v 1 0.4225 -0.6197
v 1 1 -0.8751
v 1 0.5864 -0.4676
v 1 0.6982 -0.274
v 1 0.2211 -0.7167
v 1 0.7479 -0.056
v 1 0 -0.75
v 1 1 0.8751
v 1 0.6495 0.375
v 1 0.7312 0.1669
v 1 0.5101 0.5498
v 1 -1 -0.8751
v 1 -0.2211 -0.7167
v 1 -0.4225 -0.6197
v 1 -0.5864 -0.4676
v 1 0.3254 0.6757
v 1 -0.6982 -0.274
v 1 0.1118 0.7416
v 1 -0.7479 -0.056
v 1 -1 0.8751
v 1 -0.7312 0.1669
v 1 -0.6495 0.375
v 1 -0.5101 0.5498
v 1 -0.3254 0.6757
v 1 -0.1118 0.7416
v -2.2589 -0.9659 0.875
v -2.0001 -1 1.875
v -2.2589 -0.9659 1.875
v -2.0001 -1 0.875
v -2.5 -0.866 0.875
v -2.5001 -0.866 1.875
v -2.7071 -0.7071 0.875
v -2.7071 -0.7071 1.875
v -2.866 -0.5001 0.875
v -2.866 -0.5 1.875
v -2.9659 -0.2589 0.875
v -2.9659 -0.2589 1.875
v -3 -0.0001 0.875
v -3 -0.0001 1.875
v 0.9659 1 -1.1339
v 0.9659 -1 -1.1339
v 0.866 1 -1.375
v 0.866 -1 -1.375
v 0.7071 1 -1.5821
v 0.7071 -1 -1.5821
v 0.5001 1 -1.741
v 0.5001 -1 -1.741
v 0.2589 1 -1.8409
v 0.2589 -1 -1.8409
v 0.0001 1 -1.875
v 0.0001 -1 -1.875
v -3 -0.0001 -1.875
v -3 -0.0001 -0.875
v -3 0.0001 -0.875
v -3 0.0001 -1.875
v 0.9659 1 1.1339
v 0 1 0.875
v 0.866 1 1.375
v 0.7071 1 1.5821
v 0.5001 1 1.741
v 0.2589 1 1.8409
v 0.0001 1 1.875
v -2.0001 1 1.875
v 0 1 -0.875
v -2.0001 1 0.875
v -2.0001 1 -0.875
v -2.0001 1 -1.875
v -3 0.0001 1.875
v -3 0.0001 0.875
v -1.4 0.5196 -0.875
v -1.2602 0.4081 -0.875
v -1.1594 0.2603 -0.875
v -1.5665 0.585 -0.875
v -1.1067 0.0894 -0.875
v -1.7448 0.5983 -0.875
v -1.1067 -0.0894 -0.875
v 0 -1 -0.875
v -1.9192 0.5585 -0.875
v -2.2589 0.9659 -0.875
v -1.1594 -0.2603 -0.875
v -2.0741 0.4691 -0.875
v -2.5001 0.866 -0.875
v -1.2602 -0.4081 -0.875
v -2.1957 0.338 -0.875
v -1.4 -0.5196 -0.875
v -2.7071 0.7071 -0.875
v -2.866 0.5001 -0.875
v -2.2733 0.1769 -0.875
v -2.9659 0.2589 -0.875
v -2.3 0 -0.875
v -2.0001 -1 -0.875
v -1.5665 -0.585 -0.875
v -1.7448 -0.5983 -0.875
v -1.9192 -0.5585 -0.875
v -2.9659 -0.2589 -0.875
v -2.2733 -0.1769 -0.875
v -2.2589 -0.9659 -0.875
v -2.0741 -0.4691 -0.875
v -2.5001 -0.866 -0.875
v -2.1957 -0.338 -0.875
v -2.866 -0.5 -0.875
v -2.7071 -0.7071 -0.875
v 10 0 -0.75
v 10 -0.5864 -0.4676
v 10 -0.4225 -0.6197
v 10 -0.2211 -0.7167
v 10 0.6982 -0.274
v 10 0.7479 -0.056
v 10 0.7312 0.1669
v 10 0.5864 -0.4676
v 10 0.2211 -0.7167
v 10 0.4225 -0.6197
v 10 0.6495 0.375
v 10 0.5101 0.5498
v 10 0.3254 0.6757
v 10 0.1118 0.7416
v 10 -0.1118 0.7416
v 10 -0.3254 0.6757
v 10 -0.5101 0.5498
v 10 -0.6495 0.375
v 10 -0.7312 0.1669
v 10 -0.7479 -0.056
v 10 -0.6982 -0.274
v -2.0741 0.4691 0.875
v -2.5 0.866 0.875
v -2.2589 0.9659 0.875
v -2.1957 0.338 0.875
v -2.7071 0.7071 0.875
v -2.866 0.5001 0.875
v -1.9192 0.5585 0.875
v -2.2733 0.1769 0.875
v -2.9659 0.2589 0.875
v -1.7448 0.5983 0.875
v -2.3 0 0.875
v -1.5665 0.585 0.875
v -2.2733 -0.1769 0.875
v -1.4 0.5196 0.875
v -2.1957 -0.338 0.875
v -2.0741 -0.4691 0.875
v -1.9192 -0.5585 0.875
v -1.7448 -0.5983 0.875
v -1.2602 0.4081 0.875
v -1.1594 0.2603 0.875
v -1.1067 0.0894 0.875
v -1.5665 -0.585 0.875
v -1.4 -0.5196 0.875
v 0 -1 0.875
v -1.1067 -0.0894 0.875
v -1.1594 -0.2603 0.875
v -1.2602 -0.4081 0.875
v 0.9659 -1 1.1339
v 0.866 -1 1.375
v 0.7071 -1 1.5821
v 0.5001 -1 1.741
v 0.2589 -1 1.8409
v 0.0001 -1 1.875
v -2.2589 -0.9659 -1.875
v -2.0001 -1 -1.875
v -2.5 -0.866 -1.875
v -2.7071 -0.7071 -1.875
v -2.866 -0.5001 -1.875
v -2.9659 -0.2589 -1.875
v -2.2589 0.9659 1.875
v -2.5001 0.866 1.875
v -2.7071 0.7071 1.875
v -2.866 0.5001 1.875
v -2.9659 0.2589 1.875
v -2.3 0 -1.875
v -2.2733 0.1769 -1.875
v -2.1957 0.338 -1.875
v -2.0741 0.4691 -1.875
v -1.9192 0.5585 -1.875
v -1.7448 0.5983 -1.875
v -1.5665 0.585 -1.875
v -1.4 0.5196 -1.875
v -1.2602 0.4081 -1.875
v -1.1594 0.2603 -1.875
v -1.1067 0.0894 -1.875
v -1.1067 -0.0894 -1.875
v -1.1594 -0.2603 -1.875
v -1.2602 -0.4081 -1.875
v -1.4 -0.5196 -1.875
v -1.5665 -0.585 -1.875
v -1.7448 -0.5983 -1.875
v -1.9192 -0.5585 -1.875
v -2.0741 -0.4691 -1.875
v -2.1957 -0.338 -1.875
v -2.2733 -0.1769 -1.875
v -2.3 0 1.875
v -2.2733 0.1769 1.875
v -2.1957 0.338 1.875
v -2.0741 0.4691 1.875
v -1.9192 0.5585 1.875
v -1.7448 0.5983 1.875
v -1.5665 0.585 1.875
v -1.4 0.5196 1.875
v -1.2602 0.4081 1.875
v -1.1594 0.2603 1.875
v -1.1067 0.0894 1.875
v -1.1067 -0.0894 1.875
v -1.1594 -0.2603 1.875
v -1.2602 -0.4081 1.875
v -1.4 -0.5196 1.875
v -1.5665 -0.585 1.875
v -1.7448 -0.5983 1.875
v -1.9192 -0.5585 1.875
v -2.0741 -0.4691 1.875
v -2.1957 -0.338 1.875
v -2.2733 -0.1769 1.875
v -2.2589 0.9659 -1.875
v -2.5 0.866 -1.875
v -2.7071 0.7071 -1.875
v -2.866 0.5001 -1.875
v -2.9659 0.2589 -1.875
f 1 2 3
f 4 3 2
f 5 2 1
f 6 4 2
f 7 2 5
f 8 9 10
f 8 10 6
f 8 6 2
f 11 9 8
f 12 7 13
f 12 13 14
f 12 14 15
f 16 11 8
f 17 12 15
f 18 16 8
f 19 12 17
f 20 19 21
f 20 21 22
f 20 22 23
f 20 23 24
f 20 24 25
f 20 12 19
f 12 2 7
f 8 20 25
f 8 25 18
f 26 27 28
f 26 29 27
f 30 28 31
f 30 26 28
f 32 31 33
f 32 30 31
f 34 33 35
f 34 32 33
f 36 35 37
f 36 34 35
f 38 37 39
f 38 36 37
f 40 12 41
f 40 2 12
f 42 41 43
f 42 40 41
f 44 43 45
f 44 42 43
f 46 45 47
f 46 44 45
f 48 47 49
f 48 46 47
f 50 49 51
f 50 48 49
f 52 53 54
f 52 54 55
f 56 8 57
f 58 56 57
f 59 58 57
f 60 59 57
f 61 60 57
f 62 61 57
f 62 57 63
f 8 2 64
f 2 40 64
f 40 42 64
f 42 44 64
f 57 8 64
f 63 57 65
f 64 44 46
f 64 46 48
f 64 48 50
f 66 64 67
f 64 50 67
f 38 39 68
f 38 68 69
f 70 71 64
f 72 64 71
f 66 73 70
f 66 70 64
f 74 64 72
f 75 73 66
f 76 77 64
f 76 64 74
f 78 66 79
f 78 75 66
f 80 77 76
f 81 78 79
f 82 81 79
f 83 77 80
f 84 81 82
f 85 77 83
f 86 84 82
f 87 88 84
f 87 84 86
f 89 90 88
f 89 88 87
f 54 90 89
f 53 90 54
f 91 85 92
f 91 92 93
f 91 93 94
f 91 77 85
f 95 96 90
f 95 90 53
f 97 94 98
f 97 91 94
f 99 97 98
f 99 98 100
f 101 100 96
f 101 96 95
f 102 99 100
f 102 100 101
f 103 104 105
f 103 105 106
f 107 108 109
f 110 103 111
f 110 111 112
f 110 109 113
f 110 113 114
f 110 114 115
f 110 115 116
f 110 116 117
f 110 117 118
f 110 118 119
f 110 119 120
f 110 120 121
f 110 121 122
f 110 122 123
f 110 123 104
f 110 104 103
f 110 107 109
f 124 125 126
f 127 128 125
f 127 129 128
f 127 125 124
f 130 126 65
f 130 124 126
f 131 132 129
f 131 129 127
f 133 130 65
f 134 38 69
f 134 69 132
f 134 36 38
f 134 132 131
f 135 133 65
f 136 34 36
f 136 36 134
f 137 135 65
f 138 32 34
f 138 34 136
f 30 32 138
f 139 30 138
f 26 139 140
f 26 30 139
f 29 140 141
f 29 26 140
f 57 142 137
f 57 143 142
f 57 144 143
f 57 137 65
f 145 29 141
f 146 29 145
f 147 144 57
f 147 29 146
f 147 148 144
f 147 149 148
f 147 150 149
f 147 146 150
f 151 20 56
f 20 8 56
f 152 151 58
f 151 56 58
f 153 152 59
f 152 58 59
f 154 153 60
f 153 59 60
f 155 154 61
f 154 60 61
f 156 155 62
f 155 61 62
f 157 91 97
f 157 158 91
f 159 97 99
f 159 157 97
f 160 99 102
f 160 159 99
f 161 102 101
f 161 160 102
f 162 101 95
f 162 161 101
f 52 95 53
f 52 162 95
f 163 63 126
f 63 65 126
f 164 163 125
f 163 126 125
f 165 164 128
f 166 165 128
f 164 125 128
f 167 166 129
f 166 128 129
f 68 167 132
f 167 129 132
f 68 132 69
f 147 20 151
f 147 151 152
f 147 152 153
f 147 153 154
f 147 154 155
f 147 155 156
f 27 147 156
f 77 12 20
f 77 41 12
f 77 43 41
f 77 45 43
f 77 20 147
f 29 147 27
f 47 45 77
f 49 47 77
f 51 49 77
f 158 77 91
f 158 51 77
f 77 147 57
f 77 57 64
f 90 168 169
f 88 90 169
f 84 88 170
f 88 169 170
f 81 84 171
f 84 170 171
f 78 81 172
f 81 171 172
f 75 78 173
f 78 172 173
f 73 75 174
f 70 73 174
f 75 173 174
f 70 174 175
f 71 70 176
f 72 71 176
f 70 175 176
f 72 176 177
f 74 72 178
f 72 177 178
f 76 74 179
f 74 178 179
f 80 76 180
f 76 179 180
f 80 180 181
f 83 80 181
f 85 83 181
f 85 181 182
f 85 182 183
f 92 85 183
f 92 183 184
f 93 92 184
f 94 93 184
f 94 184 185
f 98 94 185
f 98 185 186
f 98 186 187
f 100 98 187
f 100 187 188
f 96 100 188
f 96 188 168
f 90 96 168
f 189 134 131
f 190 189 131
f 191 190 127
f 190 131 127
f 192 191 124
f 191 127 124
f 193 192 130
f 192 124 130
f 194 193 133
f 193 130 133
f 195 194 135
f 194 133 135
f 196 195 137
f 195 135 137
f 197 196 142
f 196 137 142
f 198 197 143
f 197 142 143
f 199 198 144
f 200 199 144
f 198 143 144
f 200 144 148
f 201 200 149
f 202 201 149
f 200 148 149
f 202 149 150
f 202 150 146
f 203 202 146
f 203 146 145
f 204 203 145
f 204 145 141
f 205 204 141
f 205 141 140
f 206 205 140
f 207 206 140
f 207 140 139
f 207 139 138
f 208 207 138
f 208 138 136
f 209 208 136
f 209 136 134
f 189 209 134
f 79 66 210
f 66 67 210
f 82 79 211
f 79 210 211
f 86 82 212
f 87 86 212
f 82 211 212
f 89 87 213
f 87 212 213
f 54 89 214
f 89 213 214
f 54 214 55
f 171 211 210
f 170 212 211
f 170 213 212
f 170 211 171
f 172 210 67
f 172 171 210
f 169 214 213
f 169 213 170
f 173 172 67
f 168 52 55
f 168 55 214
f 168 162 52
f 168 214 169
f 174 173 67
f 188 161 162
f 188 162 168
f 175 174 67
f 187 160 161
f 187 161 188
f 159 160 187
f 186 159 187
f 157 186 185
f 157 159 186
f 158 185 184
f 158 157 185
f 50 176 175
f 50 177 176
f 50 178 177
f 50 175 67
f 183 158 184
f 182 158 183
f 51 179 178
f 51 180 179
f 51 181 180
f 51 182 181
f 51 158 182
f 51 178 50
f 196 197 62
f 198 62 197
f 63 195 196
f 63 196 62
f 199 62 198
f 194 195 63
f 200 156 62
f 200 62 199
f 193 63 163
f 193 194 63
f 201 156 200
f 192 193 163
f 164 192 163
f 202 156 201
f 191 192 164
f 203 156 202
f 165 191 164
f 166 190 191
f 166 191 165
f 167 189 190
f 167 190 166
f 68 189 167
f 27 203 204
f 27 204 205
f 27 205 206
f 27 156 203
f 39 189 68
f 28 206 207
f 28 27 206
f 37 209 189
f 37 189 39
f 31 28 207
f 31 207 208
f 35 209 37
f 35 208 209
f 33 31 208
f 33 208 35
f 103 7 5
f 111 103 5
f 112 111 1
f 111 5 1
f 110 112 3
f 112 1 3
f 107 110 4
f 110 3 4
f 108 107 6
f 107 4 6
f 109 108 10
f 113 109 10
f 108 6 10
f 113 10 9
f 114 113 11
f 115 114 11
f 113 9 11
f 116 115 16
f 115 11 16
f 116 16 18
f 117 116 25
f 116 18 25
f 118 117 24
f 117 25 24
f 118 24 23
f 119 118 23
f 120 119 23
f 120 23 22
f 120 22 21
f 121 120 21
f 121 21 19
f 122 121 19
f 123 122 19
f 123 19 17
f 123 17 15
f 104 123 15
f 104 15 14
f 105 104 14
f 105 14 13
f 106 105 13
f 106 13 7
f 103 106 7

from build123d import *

# Parameters (mm, degrees)
SKETCH1_R                = 0.75
BOSS_EXTRUDE1_DEPTH      = 10
BOSS_EXTRUDE2_DEPTH      = 1
BOSS_EXTRUDE2_DEPTH_BACK = 1
FILLET1_R                = 1
SKETCH3_R                = 0.6
CUT_EXTRUDE1_DEPTH       = 5


with BuildPart() as part:
    # Sketch1 → Boss-Extrude1 (new body)
    with BuildSketch(Plane(origin=(0, 0, 0), x_dir=(0, 0, -1), z_dir=(1, 0, 0))):
        Circle(SKETCH1_R)
    extrude(amount=BOSS_EXTRUDE1_DEPTH)

    # Sketch2 → Boss-Extrude2 (add, two sides: drawn at the far end of the back side and taken through both)
    with BuildSketch(Plane(origin=(0, 0, 0), x_dir=(1, 0, 0), z_dir=(0, 1, 0)).offset(-BOSS_EXTRUDE2_DEPTH_BACK)):
        Polygon((1, 1.875), (1, -1.875), (-3, -1.875), (-3, -0.875), (0, -0.875), (0, 0.875), (-3, 0.875), (-3, 1.875), align=None)
    extrude(amount=BOSS_EXTRUDE2_DEPTH + BOSS_EXTRUDE2_DEPTH_BACK)

    # Fillet1
    fillet1_edges = [part.edges().sort_by_distance(p)[0] for p in [
        (-3, 1, -1.375),
        (-3, -1, -1.375),
        (-3, -1, 1.375),
        (-3, 1, 1.375),
        (1, 0, -1.875),
        (1, 0, 1.875),
    ]]
    fillet(fillet1_edges, radius=FILLET1_R - 0.0001)  # a hair under: the kernel refuses the full size

    # Sketch3 → Cut-Extrude1 (cut)
    with BuildSketch(Plane(origin=(0, 0, -1.875), x_dir=(-1, 0, 0), z_dir=(0, 0, -1))):
        with Locations((1.7, 0)):
            Circle(SKETCH3_R)
    extrude(amount=-CUT_EXTRUDE1_DEPTH, mode=Mode.SUBTRACT)


solid = part.part
